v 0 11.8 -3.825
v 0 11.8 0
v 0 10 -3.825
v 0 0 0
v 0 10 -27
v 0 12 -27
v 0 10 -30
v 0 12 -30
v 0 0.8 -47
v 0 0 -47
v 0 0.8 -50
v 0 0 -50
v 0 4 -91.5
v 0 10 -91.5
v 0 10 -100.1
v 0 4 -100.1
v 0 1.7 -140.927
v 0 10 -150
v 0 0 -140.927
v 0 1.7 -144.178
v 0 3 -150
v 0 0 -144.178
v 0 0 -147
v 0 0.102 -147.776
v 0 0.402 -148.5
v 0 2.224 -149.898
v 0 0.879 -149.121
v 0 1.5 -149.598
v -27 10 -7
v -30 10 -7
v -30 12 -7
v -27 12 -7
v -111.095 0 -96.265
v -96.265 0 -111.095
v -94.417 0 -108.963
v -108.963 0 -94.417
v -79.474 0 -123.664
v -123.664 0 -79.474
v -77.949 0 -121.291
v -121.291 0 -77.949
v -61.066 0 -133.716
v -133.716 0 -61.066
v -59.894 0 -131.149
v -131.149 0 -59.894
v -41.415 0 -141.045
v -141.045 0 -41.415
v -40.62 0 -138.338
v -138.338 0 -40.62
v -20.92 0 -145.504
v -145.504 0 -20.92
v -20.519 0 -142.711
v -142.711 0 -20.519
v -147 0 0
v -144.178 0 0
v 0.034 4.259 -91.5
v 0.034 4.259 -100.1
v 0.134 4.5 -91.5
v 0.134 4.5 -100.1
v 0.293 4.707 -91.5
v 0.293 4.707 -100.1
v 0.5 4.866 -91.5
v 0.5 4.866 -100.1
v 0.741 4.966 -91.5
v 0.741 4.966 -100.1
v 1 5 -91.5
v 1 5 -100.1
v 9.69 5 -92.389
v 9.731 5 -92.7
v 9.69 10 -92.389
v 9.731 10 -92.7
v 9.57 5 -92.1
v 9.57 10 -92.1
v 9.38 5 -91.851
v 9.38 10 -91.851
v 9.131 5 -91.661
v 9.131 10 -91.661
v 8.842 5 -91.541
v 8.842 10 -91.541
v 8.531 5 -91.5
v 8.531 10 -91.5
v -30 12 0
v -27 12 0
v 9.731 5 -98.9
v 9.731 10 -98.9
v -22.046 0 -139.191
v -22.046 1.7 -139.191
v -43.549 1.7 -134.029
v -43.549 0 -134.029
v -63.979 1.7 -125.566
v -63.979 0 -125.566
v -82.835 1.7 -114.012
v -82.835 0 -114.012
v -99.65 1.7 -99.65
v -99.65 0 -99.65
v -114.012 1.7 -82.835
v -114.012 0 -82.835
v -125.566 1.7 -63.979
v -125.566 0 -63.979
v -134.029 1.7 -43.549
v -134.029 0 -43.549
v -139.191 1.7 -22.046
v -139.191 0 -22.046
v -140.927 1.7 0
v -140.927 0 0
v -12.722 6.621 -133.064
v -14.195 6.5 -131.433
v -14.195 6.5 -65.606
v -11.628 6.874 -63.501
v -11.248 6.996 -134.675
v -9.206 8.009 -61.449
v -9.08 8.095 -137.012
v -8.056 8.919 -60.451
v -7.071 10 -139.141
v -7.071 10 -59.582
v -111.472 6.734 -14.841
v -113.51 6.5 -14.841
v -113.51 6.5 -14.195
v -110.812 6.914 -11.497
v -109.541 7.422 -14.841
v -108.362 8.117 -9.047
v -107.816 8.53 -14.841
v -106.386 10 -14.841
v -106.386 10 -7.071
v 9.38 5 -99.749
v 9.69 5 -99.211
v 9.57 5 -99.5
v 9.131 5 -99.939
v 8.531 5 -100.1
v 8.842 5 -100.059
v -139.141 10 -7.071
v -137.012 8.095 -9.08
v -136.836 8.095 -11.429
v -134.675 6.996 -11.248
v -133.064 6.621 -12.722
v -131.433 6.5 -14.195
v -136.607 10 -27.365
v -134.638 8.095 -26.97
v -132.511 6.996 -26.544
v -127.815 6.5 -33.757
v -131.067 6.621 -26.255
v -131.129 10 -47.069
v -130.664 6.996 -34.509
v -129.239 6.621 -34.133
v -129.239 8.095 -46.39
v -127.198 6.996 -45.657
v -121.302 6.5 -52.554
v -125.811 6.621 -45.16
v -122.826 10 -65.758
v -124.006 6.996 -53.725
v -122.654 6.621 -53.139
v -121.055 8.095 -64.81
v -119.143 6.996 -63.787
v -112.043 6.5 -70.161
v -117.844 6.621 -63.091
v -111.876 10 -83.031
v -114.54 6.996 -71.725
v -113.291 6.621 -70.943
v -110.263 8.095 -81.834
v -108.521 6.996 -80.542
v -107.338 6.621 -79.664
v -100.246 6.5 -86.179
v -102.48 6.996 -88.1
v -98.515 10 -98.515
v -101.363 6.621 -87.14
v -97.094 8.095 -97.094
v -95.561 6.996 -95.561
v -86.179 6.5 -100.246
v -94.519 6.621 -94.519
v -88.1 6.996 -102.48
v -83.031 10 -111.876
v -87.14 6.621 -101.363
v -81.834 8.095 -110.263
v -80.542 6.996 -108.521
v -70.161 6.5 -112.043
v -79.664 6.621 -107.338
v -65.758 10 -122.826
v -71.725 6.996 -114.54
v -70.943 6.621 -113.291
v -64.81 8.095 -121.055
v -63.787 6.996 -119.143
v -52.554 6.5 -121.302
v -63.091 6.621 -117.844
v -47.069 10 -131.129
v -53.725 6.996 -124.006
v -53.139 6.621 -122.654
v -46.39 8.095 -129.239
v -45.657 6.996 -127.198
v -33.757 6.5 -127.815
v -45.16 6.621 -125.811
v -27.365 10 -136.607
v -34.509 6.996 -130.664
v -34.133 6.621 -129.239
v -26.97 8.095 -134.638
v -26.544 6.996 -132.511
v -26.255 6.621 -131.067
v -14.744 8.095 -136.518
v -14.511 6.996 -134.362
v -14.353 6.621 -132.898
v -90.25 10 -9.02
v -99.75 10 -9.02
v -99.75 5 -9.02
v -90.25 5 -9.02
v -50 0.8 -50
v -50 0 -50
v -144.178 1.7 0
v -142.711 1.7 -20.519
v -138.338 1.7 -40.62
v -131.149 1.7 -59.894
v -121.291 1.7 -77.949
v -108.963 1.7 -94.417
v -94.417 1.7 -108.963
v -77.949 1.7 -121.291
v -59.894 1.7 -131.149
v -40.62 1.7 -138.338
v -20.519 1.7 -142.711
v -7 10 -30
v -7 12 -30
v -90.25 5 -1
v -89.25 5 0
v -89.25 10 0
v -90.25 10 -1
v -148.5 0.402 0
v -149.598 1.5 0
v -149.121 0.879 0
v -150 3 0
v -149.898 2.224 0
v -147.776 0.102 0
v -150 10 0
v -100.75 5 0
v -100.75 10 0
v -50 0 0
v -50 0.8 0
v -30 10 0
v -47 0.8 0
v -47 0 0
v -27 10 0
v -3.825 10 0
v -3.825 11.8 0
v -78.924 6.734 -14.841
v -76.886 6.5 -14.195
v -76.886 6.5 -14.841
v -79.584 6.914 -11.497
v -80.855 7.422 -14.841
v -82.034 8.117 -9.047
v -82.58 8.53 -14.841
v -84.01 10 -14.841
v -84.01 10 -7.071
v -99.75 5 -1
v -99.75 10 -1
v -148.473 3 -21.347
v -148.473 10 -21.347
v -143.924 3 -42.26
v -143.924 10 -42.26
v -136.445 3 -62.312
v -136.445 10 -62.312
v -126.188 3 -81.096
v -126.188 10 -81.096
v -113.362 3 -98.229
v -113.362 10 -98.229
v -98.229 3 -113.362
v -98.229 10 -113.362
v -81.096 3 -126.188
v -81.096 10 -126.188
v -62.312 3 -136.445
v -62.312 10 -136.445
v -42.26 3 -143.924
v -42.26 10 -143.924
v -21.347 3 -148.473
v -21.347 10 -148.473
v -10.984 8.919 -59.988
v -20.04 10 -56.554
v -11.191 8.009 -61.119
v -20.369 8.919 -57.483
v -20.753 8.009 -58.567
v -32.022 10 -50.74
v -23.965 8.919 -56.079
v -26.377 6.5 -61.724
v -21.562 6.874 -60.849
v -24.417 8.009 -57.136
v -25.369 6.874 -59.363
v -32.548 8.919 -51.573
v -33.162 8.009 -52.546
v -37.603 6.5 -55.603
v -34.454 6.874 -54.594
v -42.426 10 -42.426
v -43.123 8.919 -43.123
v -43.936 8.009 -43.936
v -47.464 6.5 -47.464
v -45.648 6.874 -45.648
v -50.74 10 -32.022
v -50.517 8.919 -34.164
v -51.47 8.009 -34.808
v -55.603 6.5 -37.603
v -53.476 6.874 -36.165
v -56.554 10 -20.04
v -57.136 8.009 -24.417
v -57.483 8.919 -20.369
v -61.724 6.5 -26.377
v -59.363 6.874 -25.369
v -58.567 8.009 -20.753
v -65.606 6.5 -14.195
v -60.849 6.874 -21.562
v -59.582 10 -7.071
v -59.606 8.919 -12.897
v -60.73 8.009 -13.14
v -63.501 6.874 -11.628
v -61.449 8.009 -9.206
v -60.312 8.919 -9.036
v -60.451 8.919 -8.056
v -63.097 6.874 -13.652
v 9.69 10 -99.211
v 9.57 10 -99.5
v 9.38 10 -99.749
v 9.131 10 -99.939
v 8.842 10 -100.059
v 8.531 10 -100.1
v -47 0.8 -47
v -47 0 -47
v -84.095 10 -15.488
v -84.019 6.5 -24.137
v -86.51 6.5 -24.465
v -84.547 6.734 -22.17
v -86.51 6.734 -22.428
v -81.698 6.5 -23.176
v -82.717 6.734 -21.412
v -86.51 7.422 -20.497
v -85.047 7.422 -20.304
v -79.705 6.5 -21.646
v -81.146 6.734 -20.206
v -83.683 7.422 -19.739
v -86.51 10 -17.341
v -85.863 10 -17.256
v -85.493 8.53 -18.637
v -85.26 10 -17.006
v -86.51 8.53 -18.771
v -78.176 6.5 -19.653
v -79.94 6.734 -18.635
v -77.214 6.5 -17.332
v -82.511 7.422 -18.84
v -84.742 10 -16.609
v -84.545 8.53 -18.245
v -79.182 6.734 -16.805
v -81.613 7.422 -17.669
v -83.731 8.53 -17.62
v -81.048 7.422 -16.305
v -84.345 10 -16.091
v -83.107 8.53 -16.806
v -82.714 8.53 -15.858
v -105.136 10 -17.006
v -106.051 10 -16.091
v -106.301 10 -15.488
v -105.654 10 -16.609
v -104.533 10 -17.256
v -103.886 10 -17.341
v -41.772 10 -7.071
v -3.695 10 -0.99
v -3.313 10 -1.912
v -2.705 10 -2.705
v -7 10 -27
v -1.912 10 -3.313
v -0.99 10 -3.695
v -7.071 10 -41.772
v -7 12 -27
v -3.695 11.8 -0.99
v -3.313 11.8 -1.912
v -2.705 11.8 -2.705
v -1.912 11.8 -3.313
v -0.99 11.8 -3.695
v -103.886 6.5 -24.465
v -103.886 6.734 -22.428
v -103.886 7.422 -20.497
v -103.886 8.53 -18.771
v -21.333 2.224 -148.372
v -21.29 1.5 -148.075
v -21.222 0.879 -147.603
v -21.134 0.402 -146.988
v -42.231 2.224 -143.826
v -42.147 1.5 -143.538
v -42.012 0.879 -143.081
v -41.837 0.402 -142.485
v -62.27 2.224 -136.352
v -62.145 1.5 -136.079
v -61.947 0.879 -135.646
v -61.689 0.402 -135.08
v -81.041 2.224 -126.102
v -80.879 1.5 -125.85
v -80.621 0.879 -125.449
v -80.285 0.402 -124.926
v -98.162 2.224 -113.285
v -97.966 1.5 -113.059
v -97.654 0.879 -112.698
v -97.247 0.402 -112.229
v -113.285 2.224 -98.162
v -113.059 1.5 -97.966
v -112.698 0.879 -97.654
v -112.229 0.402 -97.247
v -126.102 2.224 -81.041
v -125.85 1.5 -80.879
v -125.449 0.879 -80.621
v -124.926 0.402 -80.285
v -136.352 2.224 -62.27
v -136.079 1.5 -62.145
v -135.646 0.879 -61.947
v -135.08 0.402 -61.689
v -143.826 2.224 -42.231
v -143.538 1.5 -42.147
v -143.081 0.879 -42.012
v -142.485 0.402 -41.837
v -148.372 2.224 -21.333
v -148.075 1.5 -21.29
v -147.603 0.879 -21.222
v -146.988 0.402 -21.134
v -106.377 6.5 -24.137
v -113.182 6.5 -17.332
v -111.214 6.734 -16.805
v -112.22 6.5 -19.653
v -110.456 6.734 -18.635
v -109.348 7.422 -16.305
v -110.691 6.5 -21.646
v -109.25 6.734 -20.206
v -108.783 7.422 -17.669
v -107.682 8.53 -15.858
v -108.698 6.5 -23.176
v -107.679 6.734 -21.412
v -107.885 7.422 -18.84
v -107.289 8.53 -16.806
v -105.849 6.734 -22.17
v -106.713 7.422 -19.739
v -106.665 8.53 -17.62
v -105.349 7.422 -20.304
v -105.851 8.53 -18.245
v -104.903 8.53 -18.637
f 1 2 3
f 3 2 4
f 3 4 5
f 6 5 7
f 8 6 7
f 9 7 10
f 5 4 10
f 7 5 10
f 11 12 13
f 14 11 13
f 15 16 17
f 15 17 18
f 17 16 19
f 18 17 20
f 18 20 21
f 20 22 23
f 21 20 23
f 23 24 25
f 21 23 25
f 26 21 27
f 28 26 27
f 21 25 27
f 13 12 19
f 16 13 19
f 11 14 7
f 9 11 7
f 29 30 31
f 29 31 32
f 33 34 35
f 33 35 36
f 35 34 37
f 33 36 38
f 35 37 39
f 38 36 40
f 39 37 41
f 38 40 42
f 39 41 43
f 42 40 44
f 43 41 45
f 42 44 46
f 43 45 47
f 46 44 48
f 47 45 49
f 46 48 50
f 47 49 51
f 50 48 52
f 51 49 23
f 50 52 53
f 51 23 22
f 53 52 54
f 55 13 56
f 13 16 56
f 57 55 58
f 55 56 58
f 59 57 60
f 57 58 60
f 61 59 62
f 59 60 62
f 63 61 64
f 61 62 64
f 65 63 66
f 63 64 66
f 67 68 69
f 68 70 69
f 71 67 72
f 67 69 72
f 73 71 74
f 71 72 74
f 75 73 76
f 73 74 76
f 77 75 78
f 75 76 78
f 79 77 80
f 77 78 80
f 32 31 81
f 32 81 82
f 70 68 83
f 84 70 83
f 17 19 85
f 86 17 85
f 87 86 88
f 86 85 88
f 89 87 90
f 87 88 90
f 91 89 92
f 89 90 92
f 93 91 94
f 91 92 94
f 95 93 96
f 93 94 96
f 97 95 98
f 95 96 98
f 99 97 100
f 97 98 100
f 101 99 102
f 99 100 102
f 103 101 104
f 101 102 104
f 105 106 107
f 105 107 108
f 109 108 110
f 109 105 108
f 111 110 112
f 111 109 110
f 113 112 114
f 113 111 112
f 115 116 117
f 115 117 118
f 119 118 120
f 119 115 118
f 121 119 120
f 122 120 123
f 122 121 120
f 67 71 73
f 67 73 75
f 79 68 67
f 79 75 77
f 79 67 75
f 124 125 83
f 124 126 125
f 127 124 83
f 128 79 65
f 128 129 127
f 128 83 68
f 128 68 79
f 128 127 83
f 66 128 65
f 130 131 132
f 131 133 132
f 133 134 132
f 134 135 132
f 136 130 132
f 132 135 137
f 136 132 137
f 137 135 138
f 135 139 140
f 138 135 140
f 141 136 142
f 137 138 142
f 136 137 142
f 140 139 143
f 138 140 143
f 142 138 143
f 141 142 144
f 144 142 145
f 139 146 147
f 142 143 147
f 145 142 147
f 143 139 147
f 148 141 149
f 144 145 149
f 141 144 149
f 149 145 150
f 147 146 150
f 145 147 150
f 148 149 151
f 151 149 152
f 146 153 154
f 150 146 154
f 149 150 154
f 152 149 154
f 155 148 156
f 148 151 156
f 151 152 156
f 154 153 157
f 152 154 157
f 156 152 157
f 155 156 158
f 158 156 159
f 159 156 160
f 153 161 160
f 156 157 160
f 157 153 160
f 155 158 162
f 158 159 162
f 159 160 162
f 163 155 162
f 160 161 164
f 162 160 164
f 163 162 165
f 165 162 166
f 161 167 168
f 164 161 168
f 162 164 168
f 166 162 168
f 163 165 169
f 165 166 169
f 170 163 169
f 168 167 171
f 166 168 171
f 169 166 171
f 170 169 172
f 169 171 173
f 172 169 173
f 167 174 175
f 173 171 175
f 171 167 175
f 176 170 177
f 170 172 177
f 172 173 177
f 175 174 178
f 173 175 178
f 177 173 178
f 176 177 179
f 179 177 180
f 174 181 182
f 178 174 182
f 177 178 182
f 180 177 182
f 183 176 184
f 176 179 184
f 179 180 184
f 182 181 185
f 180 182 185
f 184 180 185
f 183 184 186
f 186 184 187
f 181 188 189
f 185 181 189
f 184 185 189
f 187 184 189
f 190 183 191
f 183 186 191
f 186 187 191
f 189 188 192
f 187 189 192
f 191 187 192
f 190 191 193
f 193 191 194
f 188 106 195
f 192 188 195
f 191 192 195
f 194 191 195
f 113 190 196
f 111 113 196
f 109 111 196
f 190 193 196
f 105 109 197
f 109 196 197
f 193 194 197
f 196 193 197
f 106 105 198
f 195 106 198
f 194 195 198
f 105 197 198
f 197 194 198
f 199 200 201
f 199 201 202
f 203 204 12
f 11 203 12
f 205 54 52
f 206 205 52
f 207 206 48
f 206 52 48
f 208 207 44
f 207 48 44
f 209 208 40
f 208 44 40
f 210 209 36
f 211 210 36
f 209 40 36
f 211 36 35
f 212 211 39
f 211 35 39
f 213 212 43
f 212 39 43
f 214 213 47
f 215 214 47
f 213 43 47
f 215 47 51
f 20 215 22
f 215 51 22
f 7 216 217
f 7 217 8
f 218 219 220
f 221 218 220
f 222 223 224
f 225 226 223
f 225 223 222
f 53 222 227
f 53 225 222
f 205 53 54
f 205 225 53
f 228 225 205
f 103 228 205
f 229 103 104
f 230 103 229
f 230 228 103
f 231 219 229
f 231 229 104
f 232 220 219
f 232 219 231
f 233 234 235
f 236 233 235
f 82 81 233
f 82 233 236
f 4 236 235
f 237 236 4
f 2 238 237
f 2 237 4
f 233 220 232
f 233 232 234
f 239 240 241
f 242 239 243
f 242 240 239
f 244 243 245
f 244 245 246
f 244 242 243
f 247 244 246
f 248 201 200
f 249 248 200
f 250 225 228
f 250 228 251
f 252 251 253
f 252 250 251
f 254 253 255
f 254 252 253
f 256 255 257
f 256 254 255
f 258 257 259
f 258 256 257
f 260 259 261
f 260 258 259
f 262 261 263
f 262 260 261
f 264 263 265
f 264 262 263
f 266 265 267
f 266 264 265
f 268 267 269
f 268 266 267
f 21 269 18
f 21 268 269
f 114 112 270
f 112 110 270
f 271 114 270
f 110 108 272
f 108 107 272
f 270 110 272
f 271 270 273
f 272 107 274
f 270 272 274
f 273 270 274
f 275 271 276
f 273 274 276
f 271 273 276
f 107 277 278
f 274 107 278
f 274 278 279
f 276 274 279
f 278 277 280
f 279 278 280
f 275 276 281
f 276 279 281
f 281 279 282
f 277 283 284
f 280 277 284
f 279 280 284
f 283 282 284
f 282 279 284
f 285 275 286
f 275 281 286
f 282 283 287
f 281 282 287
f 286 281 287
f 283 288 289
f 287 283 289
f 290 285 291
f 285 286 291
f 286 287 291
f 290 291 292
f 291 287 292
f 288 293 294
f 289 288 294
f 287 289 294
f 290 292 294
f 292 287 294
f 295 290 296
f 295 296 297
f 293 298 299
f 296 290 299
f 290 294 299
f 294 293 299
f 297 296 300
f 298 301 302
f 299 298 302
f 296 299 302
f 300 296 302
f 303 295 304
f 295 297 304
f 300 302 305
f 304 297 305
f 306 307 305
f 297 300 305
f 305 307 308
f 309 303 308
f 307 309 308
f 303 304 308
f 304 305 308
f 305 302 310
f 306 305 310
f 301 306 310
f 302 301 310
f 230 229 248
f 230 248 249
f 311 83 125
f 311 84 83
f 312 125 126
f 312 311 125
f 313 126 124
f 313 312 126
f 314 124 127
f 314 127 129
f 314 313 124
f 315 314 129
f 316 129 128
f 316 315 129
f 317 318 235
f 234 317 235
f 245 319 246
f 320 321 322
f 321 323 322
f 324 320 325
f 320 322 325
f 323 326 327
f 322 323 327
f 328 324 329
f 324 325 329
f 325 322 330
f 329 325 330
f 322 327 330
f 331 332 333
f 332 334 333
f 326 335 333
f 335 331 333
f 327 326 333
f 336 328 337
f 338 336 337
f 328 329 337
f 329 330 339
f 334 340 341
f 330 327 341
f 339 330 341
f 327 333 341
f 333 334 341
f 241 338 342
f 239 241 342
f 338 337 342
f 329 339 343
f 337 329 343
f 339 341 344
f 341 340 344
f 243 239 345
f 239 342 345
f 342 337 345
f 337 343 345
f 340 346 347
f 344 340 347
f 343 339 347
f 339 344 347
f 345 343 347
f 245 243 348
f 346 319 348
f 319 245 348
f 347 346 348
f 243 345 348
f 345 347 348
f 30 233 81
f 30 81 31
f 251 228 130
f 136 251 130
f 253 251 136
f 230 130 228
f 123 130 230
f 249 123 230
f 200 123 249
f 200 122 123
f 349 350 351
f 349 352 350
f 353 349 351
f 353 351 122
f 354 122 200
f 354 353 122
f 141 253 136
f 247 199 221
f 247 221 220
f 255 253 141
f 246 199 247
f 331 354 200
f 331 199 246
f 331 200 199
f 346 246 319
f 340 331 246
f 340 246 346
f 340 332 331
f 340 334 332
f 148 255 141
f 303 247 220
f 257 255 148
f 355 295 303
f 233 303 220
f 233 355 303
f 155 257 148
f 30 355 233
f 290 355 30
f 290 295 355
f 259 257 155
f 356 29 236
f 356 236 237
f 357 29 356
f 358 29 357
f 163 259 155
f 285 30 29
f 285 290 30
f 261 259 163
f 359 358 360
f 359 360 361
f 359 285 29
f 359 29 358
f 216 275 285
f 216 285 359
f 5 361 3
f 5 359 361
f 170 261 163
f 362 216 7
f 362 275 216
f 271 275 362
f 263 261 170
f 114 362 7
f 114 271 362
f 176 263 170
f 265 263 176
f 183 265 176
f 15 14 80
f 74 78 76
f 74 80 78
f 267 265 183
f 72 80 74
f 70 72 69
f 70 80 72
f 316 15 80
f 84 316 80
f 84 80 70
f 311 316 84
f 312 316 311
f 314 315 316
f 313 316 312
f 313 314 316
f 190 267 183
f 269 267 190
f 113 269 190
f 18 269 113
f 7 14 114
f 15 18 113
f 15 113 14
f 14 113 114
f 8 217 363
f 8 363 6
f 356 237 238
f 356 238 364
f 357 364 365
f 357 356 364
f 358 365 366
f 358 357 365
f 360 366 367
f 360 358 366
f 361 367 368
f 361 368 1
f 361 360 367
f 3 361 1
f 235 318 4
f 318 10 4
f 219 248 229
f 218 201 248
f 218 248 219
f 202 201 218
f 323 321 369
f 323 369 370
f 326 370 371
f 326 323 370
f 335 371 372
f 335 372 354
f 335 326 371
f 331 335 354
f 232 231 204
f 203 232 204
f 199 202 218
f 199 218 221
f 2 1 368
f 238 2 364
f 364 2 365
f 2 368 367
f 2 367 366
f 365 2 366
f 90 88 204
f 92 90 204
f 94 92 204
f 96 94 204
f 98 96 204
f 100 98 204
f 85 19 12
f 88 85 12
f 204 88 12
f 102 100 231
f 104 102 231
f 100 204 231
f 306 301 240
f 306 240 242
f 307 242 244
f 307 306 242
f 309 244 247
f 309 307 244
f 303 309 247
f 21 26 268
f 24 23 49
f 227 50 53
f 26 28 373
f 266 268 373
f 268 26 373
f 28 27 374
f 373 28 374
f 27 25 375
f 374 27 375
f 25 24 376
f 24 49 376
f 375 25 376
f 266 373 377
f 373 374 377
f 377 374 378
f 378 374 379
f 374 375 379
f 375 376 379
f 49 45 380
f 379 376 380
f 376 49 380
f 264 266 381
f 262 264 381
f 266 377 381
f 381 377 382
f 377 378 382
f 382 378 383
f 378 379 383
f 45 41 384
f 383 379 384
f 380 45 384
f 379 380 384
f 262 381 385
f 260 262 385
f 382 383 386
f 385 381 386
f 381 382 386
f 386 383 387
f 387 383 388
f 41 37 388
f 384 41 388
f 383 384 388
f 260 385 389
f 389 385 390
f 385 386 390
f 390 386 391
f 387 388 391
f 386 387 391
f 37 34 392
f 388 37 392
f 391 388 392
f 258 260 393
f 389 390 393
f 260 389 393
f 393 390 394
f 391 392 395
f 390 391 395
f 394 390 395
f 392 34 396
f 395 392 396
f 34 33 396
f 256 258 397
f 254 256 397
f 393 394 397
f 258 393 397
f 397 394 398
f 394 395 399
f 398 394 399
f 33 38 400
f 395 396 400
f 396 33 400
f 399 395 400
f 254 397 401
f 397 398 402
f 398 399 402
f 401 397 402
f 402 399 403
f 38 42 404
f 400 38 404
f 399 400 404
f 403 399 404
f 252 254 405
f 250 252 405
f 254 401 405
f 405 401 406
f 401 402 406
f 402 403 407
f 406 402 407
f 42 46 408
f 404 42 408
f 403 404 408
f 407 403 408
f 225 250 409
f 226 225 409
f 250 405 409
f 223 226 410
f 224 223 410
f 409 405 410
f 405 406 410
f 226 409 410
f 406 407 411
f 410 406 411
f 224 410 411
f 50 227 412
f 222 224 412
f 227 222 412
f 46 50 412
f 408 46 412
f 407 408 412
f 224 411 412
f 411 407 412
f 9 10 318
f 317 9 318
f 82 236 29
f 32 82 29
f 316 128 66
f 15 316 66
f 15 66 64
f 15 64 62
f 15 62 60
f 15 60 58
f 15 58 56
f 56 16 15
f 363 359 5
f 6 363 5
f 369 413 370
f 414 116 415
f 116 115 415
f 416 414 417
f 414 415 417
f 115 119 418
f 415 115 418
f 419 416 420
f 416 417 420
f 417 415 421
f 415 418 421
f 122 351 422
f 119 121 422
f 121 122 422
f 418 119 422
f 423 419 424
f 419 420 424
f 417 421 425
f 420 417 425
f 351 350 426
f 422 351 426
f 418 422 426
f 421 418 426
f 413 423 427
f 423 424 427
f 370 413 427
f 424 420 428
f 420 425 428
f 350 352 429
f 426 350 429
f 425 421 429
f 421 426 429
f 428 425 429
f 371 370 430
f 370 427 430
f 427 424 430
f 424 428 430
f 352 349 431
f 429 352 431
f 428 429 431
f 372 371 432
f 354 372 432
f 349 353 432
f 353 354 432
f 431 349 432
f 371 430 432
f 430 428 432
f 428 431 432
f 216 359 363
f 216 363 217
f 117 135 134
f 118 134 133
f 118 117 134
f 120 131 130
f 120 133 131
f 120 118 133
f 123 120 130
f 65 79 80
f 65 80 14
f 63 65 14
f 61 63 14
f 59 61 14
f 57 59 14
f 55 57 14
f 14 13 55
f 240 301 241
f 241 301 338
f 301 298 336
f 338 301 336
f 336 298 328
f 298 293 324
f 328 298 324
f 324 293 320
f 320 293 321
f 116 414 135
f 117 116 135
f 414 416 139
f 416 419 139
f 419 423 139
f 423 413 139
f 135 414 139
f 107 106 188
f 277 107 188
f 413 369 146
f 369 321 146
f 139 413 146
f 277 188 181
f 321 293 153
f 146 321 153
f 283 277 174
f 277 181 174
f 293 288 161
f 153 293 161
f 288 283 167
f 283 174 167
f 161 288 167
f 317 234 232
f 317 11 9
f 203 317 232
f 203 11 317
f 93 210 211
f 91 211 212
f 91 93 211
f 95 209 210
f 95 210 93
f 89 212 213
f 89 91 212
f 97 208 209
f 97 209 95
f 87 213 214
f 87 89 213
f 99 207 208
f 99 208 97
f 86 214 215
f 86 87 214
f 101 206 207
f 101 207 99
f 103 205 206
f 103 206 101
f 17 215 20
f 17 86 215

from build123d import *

# Parameters (mm, degrees)
SKETCH1_R            = 150
BOSS_EXTRUDE3_DEPTH  = 10
CUT_EXTRUDE2_DEPTH   = 10
BOSS_EXTRUDE4_DEPTH  = 1.8
SKETCH6_W            = 3
SKETCH6_H            = 7
BOSS_EXTRUDE5_DEPTH  = 2
SKETCH7_W            = 7
SKETCH7_H            = 3
BOSS_EXTRUDE6_DEPTH  = 2
SKETCH8_W            = 10
SKETCH8_H            = 10
CUT_EXTRUDE3_DEPTH   = 5
SKETCH9_W            = 9.193751657
SKETCH9_H            = 8.277315045
BOSS_EXTRUDE7_DEPTH  = 4.35
CHAMFER1_SIZE        = 1
CUT_EXTRUDE4_DEPTH   = 1.7
CUT_EXTRUDE5_DEPTH   = 0.8
FILLET1_R            = 3
FILLET2_R            = 1.4
SKETCH12_W           = 10.671911796
SKETCH12_H           = 9.690192172
CUT_EXTRUDE6_DEPTH   = 11
SKETCH13_W           = 9.731136712
SKETCH13_H           = 8.6
BOSS_EXTRUDE8_DEPTH  = 10
SKETCH14_W           = 9.731136712
SKETCH14_H           = 8.6
CUT_EXTRUDE7_DEPTH   = 5
FILLET3_R            = 1
FILLET4_R            = 1.2
CUT_EXTRUDE8_DEPTH   = 3.5
FILLET5_R            = 2.5
FILLET6_R            = 9
SKETCH16_W           = 0.25
SKETCH16_H           = 5
BOSS_EXTRUDE9_DEPTH  = 11.5
SKETCH17_W           = 9.5
SKETCH17_H           = 5
BOSS_EXTRUDE12_DEPTH = 0.13
SKETCH19_W           = 9.5
SKETCH19_H           = 5
BOSS_EXTRUDE13_DEPTH = 0.85
CHAMFER2_SIZE        = 1


with BuildPart() as part:
    # Sketch1 → Boss-Extrude3 (new body)
    with BuildSketch(Plane(origin=(0, 0, 0), x_dir=(1, 0, 0), z_dir=(0, 1, 0))):
        with Locations(Location((0, 0, 0), (0, 0, 270))):
            Circle(SKETCH1_R)
    extrude(amount=BOSS_EXTRUDE3_DEPTH)

    # Sketch4 → Cut-Extrude2 (cut)
    with BuildSketch(Plane(origin=(0, 10, 0), x_dir=(1, 0, 0), z_dir=(0, 1, 0))):
        Polygon((0, 0), (0, 162.329653064), (183.678217859, 162.329653064), (183.678217859, -176.427761891), (-217.916482153, -176.427761891), (-217.916482153, 0), align=None)
    extrude(amount=-CUT_EXTRUDE2_DEPTH, mode=Mode.SUBTRACT)

    # Sketch5 → Boss-Extrude4 (add)
    with BuildSketch(Plane(origin=(0, 10, 0), x_dir=(1, 0, 0), z_dir=(0, 1, 0))):
        with BuildLine():
            Line((0, 3.825), (0, 0))
            Line((0, 0), (-3.825, 0))
            ThreePointArc((-3.825, 0), (-2.704683438, 2.704683438), (0, 3.825))
        make_face()
    extrude(amount=BOSS_EXTRUDE4_DEPTH)

    # Sketch6 → Boss-Extrude5 (add)
    with BuildSketch(Plane(origin=(0, 10, 0), x_dir=(1, 0, 0), z_dir=(0, 1, 0))):
        with Locations((-28.5, 3.5)):
            Rectangle(SKETCH6_W, SKETCH6_H)
    extrude(amount=BOSS_EXTRUDE5_DEPTH)

    # Sketch7 → Boss-Extrude6 (add)
    with BuildSketch(Plane(origin=(0, 10, 0), x_dir=(1, 0, 0), z_dir=(0, 1, 0))):
        with Locations((-3.5, 28.5)):
            Rectangle(SKETCH7_W, SKETCH7_H)
    extrude(amount=BOSS_EXTRUDE6_DEPTH)

    # Sketch8 → Cut-Extrude3 (cut)
    with BuildSketch(Plane(origin=(0, 10, 0), x_dir=(1, 0, 0), z_dir=(0, 1, 0))):
        with Locations((-95, 5)):
            Rectangle(SKETCH8_W, SKETCH8_H)
    extrude(amount=-CUT_EXTRUDE3_DEPTH, mode=Mode.SUBTRACT)

    # Sketch9 → Boss-Extrude7 (add)
    with BuildSketch(Plane(origin=(0, 10, 0), x_dir=(1, 0, 0), z_dir=(0, 1, 0))):
        with Locations((4.596875828, 95.138657523)):
            Rectangle(SKETCH9_W, SKETCH9_H)
    extrude(amount=-BOSS_EXTRUDE7_DEPTH)

    # Chamfer1
    chamfer1_edges = [part.edges().sort_by_distance(p)[0] for p in [
        (9.193751657, 7.825, -99.277315045),
        (9.193751657, 7.825, -91),
    ]]
    chamfer(chamfer1_edges, length=CHAMFER1_SIZE)

    # Sketch10 → Cut-Extrude4 (cut)
    with BuildSketch(Plane.XZ):
        with BuildLine():
            Line((-140.926536809, 0), (-144.178447036, 0))
            ThreePointArc((-144.178447036, 0), (-101.9495576, -101.9495576), (0, -144.178447036))
            Line((0, -144.178447036), (0, -140.926536809))
            ThreePointArc((0, -140.926536809), (-99.650109827, -99.650109827), (-140.926536809, 0))
        make_face()
    extrude(amount=-CUT_EXTRUDE4_DEPTH, mode=Mode.SUBTRACT)

    # Sketch11 → Cut-Extrude5 (cut)
    with BuildSketch(Plane(origin=(0, 0, 0), x_dir=(-1, 0, 0), z_dir=(0, -1, 0))):
        Polygon((47, 0), (50, 0), (50, 50), (0, 50), (0, 47), (47, 47), align=None)
    extrude(amount=-CUT_EXTRUDE5_DEPTH, mode=Mode.SUBTRACT)

    # Fillet1
    fillet1_edges = [part.edges().sort_by_distance(p)[0] for p in [
        (-106.066017178, 0, -106.066017178),
    ]]
    fillet(fillet1_edges, radius=FILLET1_R)

    # Fillet2
    fillet2_edges = [part.edges().sort_by_distance(p)[0] for p in [
        (0, 5.65, -95.138657523),
    ]]
    fillet(fillet2_edges, radius=FILLET2_R)

    # Sketch12 → Cut-Extrude6 (cut)
    with BuildSketch(Plane(origin=(0, 0, 0), x_dir=(-1, 0, 0), z_dir=(0, -1, 0))):
        with Locations((-5.335955898, 95.265421493)):
            Rectangle(SKETCH12_W, SKETCH12_H)
    extrude(amount=-CUT_EXTRUDE6_DEPTH, mode=Mode.SUBTRACT)

    # Sketch13 → Boss-Extrude8 (add)
    with BuildSketch(Plane(origin=(0, 0, 0), x_dir=(-1, 0, 0), z_dir=(0, -1, 0))):
        with Locations((-4.865568356, 95.8)):
            Rectangle(SKETCH13_W, SKETCH13_H)
    extrude(amount=-BOSS_EXTRUDE8_DEPTH)

    # Sketch14 → Cut-Extrude7 (cut)
    with BuildSketch(Plane(origin=(0, 0, 0), x_dir=(-1, 0, 0), z_dir=(0, -1, 0))):
        with Locations((-4.865568356, 95.8)):
            Rectangle(SKETCH14_W, SKETCH14_H)
    extrude(amount=-CUT_EXTRUDE7_DEPTH, mode=Mode.SUBTRACT)

    # Fillet3
    fillet3_edges = [part.edges().sort_by_distance(p)[0] for p in [
        (0, 5, -95.8),
    ]]
    fillet(fillet3_edges, radius=FILLET3_R)

    # Fillet4
    fillet4_edges = [part.edges().sort_by_distance(p)[0] for p in [
        (9.731136712, 7.5, -91.5),
        (9.731136712, 7.5, -100.1),
    ]]
    fillet(fillet4_edges, radius=FILLET4_R)

    # Sketch15 → Cut-Extrude8 (cut)
    with BuildSketch(Plane(origin=(0, 10, 0), x_dir=(1, 0, 0), z_dir=(0, 1, 0))):
        with BuildLine():
            Line((-84.010224854, 7.071067812), (-84.010224854, 17.341351392))
            Line((-84.010224854, 17.341351392), (-106.385767568, 17.341351392))
            Line((-106.385767568, 17.341351392), (-106.385767568, 7.071067812))
            Line((-106.385767568, 7.071067812), (-139.141411083, 7.071067812))
            ThreePointArc((-139.141411083, 7.071067812), (-98.514801625, 98.514801625), (-7.071067812, 139.141411083))
            Line((-7.071067812, 139.141411083), (-7.071067812, 59.581876439))
            ThreePointArc((-7.071067812, 59.581876439), (-42.426406871, 42.426406871), (-59.581876439, 7.071067812))
            Line((-59.581876439, 7.071067812), (-84.010224854, 7.071067812))
        make_face()
    extrude(amount=-CUT_EXTRUDE8_DEPTH, mode=Mode.SUBTRACT)

    # Fillet5
    fillet5_edges = [part.edges().sort_by_distance(p)[0] for p in [
        (-84.010224854, 8.25, -17.341351392),
        (-106.385767568, 8.25, -17.341351392),
    ]]
    fillet(fillet5_edges, radius=FILLET5_R)

    # Fillet6
    # the kernel refuses this fillet: 9 mm, written as the material it adds along each edge
    with BuildSketch(Plane(origin=(-103.885767568, 6.5, -14.841351392), x_dir=(-1, 0, 0), z_dir=(0, 0, 1))) as fillet6_piece_1:
        with BuildLine():
            CenterArc((9.623903424, -9), FILLET6_R, 90, 52.330113036)
            Line((9.623903424, 0), (2.5, 0))
            Line((2.5, 0), (2.5, -3.5))
        make_face()
    revolve(axis=Axis((-103.885767568, 6.5, -14.841351392), (0, -1, 0)), revolution_arc=90)
    with BuildSketch(Plane(origin=(-86.510224854, 6.5, -14.841351392), x_dir=(0, 0, -1), z_dir=(-1, 0, 0))) as fillet6_piece_2:
        with BuildLine():
            CenterArc((9.623903424, -9), FILLET6_R, 90, 52.330113036)
            Line((9.623903424, 0), (2.5, 0))
            Line((2.5, 0), (2.5, -3.5))
        make_face()
    revolve(axis=Axis((-86.510224854, 6.5, -14.841351392), (0, -1, 0)), revolution_arc=90)
    with BuildSketch(Plane(origin=(0, 6.5, 0), x_dir=(-0.9970291212395074, 0, 0.07702552434340171), z_dir=(0.07702552434340171, 0, 0.9970291212395074))) as fillet6_piece_3_section:
        with BuildLine():
            CenterArc((132.197065128, -9), FILLET6_R, 37.669886964, 52.330113036)
            Line((132.197065128, 0), (139.320968552, 0))
            Line((139.320968552, 0), (139.320968552, -3.5))
        make_face()
    fillet6_piece_3 = revolve(axis=Axis((0, 6.5, 0), (0, -1, 0)), revolution_arc=98.835226115, mode=Mode.PRIVATE)
    fillet6_piece_3 = split(fillet6_piece_3, bisect_by=Plane(origin=(0, 6.5, 0), z_dir=(-1, 0, 0)), keep=Keep.TOP, mode=Mode.PRIVATE)
    fillet6_piece_3 = split(fillet6_piece_3, bisect_by=Plane(origin=(0, 6.5, 0), z_dir=(0, 0, -1)), keep=Keep.TOP, mode=Mode.PRIVATE)
    add(fillet6_piece_3)
    with BuildSketch(Plane(origin=(-88.576009007, 6.5, -7.071067812), x_dir=(0, 1, 0), z_dir=(-1, 0, 0))) as fillet6_piece_4_section:
        with BuildLine():
            CenterArc((9, 7.123903424), FILLET6_R, 180, 52.330113036)
            Line((0, 7.123903424), (0, 0))
            Line((0, 0), (3.5, 0))
        make_face()
    fillet6_piece_4 = extrude(amount=68.375160637, mode=Mode.PRIVATE)
    fillet6_piece_4 = fillet6_piece_4 & Plane(origin=(0, 6.5, 0), x_dir=(0, 0, 1), z_dir=(0, -1, 0)) * Cylinder(150, 166, mode=Mode.PRIVATE)
    fillet6_piece_4 = split(fillet6_piece_4, bisect_by=Plane(origin=(-100, 6.5, -7.071067812), z_dir=(-1, 0, 0)), keep=Keep.TOP, mode=Mode.PRIVATE)
    add(fillet6_piece_4)
    with BuildSketch(Plane(origin=(-86.510224854, 6.5, -17.341351392), x_dir=(0, 1, 0), z_dir=(-1, 0, 0))) as fillet6_piece_5:
        with BuildLine():
            CenterArc((9, 7.123903424), FILLET6_R, 180, 52.330113036)
            Line((0, 7.123903424), (0, 0))
            Line((0, 0), (3.5, 0))
        make_face()
    extrude(amount=17.375542715)
    with BuildSketch(Plane(origin=(-41.772117878, 6.5, -7.071067812), x_dir=(0, 1, 0), z_dir=(-1, 0, 0))) as fillet6_piece_6_section:
        with BuildLine():
            CenterArc((9, 7.123903424), FILLET6_R, 180, 52.330113036)
            Line((0, 7.123903424), (0, 0))
            Line((0, 0), (3.5, 0))
        make_face()
    fillet6_piece_6 = extrude(amount=60.047865536, mode=Mode.PRIVATE)
    fillet6_piece_6 = split(fillet6_piece_6, bisect_by=Plane(origin=(-90, 6.5, -7.071067812), z_dir=(1, 0, 0)), keep=Keep.TOP, mode=Mode.PRIVATE)
    add(fillet6_piece_6)
    with BuildSketch(Plane(origin=(-7.071067812, 6.5, -156.951169644), x_dir=(0, 1, 0), z_dir=(0, 0, 1))) as fillet6_piece_7_section:
        with BuildLine():
            CenterArc((9, 7.123903424), FILLET6_R, 180, 52.330113036)
            Line((0, 7.123903424), (0, 0))
            Line((0, 0), (3.5, 0))
        make_face()
    fillet6_piece_7 = extrude(amount=115.179051766, mode=Mode.PRIVATE)
    fillet6_piece_7 = fillet6_piece_7 & Plane(origin=(0, 6.5, 0), x_dir=(0, 0, 1), z_dir=(0, -1, 0)) * Cylinder(150, 259, mode=Mode.PRIVATE)
    add(fillet6_piece_7)
    with BuildSketch(Plane(origin=(0, 6.5, 0), x_dir=(0.17783871438849583, 0, -0.9840596484282074), z_dir=(0.9840596484282074, 0, 0.17783871438849583))) as fillet6_piece_8_section:
        with BuildLine():
            CenterArc((67.123903424, 9), FILLET6_R, 217.669886964, 52.330113036)
            Line((67.123903424, 0), (60, 0))
            Line((60, 0), (60, 3.5))
        make_face()
    fillet6_piece_8 = revolve(axis=Axis((0, 6.5, 0), (0, 1, 0)), revolution_arc=110.487792536, mode=Mode.PRIVATE)
    fillet6_piece_8 = split(fillet6_piece_8, bisect_by=Plane(origin=(0, 6.5, 0), z_dir=(-1, 0, 0)), keep=Keep.TOP, mode=Mode.PRIVATE)
    fillet6_piece_8 = split(fillet6_piece_8, bisect_by=Plane(origin=(0, 6.5, 0), z_dir=(0, 0, -1)), keep=Keep.TOP, mode=Mode.PRIVATE)
    add(fillet6_piece_8)
    with BuildSketch(Plane(origin=(-84.010224854, 6.5, 10.738690749), x_dir=(0, 1, 0), z_dir=(0, 0, -1))) as fillet6_piece_9_section:
        with BuildLine():
            CenterArc((9, 7.123903424), FILLET6_R, 180, 52.330113036)
            Line((0, 7.123903424), (0, 0))
            Line((0, 0), (3.5, 0))
        make_face()
    fillet6_piece_9 = extrude(amount=25.580042141, mode=Mode.PRIVATE)
    fillet6_piece_9 = split(fillet6_piece_9, bisect_by=Plane(origin=(-84.010224854, 6.5, 0), z_dir=(0, 0, -1)), keep=Keep.TOP, mode=Mode.PRIVATE)
    add(fillet6_piece_9)
    with BuildSketch(Plane(origin=(-106.385767568, 6.5, -14.841351392), x_dir=(0, 1, 0), z_dir=(0, 0, 1))) as fillet6_piece_10_section:
        with BuildLine():
            CenterArc((9, 7.123903424), FILLET6_R, 180, 52.330113036)
            Line((0, 7.123903424), (0, 0))
            Line((0, 0), (3.5, 0))
        make_face()
    fillet6_piece_10 = extrude(amount=25.580042141, mode=Mode.PRIVATE)
    fillet6_piece_10 = split(fillet6_piece_10, bisect_by=Plane(origin=(-106.385767568, 6.5, 0), z_dir=(0, 0, -1)), keep=Keep.TOP, mode=Mode.PRIVATE)
    add(fillet6_piece_10)

    # Sketch16 → Boss-Extrude9 (add)
    with BuildSketch(Plane.XY):
        with Locations((-99.875, 7.5)):
            Rectangle(SKETCH16_W, SKETCH16_H)
        with Locations((-90.125, 7.5)):
            Rectangle(SKETCH16_W, SKETCH16_H)
    extrude(amount=-BOSS_EXTRUDE9_DEPTH)

    # Sketch17 → Boss-Extrude12 (add)
    with BuildSketch(Plane.XY.offset(-10)):
        with Locations((-95, 7.5)):
            Rectangle(SKETCH17_W, SKETCH17_H)
    extrude(amount=BOSS_EXTRUDE12_DEPTH)

    # Sketch19 → Boss-Extrude13 (add)
    with BuildSketch(Plane.XY.offset(-9.87)):
        with Locations((-95, 7.5)):
            Rectangle(SKETCH19_W, SKETCH19_H)
    extrude(amount=BOSS_EXTRUDE13_DEPTH)

    # Chamfer2
    chamfer2_edges = [part.edges().sort_by_distance(p)[0] for p in [
        (-99.75, 7.5, 0),
        (-90.25, 7.5, 0),
    ]]
    chamfer(chamfer2_edges, length=CHAMFER2_SIZE)


solid = part.part
